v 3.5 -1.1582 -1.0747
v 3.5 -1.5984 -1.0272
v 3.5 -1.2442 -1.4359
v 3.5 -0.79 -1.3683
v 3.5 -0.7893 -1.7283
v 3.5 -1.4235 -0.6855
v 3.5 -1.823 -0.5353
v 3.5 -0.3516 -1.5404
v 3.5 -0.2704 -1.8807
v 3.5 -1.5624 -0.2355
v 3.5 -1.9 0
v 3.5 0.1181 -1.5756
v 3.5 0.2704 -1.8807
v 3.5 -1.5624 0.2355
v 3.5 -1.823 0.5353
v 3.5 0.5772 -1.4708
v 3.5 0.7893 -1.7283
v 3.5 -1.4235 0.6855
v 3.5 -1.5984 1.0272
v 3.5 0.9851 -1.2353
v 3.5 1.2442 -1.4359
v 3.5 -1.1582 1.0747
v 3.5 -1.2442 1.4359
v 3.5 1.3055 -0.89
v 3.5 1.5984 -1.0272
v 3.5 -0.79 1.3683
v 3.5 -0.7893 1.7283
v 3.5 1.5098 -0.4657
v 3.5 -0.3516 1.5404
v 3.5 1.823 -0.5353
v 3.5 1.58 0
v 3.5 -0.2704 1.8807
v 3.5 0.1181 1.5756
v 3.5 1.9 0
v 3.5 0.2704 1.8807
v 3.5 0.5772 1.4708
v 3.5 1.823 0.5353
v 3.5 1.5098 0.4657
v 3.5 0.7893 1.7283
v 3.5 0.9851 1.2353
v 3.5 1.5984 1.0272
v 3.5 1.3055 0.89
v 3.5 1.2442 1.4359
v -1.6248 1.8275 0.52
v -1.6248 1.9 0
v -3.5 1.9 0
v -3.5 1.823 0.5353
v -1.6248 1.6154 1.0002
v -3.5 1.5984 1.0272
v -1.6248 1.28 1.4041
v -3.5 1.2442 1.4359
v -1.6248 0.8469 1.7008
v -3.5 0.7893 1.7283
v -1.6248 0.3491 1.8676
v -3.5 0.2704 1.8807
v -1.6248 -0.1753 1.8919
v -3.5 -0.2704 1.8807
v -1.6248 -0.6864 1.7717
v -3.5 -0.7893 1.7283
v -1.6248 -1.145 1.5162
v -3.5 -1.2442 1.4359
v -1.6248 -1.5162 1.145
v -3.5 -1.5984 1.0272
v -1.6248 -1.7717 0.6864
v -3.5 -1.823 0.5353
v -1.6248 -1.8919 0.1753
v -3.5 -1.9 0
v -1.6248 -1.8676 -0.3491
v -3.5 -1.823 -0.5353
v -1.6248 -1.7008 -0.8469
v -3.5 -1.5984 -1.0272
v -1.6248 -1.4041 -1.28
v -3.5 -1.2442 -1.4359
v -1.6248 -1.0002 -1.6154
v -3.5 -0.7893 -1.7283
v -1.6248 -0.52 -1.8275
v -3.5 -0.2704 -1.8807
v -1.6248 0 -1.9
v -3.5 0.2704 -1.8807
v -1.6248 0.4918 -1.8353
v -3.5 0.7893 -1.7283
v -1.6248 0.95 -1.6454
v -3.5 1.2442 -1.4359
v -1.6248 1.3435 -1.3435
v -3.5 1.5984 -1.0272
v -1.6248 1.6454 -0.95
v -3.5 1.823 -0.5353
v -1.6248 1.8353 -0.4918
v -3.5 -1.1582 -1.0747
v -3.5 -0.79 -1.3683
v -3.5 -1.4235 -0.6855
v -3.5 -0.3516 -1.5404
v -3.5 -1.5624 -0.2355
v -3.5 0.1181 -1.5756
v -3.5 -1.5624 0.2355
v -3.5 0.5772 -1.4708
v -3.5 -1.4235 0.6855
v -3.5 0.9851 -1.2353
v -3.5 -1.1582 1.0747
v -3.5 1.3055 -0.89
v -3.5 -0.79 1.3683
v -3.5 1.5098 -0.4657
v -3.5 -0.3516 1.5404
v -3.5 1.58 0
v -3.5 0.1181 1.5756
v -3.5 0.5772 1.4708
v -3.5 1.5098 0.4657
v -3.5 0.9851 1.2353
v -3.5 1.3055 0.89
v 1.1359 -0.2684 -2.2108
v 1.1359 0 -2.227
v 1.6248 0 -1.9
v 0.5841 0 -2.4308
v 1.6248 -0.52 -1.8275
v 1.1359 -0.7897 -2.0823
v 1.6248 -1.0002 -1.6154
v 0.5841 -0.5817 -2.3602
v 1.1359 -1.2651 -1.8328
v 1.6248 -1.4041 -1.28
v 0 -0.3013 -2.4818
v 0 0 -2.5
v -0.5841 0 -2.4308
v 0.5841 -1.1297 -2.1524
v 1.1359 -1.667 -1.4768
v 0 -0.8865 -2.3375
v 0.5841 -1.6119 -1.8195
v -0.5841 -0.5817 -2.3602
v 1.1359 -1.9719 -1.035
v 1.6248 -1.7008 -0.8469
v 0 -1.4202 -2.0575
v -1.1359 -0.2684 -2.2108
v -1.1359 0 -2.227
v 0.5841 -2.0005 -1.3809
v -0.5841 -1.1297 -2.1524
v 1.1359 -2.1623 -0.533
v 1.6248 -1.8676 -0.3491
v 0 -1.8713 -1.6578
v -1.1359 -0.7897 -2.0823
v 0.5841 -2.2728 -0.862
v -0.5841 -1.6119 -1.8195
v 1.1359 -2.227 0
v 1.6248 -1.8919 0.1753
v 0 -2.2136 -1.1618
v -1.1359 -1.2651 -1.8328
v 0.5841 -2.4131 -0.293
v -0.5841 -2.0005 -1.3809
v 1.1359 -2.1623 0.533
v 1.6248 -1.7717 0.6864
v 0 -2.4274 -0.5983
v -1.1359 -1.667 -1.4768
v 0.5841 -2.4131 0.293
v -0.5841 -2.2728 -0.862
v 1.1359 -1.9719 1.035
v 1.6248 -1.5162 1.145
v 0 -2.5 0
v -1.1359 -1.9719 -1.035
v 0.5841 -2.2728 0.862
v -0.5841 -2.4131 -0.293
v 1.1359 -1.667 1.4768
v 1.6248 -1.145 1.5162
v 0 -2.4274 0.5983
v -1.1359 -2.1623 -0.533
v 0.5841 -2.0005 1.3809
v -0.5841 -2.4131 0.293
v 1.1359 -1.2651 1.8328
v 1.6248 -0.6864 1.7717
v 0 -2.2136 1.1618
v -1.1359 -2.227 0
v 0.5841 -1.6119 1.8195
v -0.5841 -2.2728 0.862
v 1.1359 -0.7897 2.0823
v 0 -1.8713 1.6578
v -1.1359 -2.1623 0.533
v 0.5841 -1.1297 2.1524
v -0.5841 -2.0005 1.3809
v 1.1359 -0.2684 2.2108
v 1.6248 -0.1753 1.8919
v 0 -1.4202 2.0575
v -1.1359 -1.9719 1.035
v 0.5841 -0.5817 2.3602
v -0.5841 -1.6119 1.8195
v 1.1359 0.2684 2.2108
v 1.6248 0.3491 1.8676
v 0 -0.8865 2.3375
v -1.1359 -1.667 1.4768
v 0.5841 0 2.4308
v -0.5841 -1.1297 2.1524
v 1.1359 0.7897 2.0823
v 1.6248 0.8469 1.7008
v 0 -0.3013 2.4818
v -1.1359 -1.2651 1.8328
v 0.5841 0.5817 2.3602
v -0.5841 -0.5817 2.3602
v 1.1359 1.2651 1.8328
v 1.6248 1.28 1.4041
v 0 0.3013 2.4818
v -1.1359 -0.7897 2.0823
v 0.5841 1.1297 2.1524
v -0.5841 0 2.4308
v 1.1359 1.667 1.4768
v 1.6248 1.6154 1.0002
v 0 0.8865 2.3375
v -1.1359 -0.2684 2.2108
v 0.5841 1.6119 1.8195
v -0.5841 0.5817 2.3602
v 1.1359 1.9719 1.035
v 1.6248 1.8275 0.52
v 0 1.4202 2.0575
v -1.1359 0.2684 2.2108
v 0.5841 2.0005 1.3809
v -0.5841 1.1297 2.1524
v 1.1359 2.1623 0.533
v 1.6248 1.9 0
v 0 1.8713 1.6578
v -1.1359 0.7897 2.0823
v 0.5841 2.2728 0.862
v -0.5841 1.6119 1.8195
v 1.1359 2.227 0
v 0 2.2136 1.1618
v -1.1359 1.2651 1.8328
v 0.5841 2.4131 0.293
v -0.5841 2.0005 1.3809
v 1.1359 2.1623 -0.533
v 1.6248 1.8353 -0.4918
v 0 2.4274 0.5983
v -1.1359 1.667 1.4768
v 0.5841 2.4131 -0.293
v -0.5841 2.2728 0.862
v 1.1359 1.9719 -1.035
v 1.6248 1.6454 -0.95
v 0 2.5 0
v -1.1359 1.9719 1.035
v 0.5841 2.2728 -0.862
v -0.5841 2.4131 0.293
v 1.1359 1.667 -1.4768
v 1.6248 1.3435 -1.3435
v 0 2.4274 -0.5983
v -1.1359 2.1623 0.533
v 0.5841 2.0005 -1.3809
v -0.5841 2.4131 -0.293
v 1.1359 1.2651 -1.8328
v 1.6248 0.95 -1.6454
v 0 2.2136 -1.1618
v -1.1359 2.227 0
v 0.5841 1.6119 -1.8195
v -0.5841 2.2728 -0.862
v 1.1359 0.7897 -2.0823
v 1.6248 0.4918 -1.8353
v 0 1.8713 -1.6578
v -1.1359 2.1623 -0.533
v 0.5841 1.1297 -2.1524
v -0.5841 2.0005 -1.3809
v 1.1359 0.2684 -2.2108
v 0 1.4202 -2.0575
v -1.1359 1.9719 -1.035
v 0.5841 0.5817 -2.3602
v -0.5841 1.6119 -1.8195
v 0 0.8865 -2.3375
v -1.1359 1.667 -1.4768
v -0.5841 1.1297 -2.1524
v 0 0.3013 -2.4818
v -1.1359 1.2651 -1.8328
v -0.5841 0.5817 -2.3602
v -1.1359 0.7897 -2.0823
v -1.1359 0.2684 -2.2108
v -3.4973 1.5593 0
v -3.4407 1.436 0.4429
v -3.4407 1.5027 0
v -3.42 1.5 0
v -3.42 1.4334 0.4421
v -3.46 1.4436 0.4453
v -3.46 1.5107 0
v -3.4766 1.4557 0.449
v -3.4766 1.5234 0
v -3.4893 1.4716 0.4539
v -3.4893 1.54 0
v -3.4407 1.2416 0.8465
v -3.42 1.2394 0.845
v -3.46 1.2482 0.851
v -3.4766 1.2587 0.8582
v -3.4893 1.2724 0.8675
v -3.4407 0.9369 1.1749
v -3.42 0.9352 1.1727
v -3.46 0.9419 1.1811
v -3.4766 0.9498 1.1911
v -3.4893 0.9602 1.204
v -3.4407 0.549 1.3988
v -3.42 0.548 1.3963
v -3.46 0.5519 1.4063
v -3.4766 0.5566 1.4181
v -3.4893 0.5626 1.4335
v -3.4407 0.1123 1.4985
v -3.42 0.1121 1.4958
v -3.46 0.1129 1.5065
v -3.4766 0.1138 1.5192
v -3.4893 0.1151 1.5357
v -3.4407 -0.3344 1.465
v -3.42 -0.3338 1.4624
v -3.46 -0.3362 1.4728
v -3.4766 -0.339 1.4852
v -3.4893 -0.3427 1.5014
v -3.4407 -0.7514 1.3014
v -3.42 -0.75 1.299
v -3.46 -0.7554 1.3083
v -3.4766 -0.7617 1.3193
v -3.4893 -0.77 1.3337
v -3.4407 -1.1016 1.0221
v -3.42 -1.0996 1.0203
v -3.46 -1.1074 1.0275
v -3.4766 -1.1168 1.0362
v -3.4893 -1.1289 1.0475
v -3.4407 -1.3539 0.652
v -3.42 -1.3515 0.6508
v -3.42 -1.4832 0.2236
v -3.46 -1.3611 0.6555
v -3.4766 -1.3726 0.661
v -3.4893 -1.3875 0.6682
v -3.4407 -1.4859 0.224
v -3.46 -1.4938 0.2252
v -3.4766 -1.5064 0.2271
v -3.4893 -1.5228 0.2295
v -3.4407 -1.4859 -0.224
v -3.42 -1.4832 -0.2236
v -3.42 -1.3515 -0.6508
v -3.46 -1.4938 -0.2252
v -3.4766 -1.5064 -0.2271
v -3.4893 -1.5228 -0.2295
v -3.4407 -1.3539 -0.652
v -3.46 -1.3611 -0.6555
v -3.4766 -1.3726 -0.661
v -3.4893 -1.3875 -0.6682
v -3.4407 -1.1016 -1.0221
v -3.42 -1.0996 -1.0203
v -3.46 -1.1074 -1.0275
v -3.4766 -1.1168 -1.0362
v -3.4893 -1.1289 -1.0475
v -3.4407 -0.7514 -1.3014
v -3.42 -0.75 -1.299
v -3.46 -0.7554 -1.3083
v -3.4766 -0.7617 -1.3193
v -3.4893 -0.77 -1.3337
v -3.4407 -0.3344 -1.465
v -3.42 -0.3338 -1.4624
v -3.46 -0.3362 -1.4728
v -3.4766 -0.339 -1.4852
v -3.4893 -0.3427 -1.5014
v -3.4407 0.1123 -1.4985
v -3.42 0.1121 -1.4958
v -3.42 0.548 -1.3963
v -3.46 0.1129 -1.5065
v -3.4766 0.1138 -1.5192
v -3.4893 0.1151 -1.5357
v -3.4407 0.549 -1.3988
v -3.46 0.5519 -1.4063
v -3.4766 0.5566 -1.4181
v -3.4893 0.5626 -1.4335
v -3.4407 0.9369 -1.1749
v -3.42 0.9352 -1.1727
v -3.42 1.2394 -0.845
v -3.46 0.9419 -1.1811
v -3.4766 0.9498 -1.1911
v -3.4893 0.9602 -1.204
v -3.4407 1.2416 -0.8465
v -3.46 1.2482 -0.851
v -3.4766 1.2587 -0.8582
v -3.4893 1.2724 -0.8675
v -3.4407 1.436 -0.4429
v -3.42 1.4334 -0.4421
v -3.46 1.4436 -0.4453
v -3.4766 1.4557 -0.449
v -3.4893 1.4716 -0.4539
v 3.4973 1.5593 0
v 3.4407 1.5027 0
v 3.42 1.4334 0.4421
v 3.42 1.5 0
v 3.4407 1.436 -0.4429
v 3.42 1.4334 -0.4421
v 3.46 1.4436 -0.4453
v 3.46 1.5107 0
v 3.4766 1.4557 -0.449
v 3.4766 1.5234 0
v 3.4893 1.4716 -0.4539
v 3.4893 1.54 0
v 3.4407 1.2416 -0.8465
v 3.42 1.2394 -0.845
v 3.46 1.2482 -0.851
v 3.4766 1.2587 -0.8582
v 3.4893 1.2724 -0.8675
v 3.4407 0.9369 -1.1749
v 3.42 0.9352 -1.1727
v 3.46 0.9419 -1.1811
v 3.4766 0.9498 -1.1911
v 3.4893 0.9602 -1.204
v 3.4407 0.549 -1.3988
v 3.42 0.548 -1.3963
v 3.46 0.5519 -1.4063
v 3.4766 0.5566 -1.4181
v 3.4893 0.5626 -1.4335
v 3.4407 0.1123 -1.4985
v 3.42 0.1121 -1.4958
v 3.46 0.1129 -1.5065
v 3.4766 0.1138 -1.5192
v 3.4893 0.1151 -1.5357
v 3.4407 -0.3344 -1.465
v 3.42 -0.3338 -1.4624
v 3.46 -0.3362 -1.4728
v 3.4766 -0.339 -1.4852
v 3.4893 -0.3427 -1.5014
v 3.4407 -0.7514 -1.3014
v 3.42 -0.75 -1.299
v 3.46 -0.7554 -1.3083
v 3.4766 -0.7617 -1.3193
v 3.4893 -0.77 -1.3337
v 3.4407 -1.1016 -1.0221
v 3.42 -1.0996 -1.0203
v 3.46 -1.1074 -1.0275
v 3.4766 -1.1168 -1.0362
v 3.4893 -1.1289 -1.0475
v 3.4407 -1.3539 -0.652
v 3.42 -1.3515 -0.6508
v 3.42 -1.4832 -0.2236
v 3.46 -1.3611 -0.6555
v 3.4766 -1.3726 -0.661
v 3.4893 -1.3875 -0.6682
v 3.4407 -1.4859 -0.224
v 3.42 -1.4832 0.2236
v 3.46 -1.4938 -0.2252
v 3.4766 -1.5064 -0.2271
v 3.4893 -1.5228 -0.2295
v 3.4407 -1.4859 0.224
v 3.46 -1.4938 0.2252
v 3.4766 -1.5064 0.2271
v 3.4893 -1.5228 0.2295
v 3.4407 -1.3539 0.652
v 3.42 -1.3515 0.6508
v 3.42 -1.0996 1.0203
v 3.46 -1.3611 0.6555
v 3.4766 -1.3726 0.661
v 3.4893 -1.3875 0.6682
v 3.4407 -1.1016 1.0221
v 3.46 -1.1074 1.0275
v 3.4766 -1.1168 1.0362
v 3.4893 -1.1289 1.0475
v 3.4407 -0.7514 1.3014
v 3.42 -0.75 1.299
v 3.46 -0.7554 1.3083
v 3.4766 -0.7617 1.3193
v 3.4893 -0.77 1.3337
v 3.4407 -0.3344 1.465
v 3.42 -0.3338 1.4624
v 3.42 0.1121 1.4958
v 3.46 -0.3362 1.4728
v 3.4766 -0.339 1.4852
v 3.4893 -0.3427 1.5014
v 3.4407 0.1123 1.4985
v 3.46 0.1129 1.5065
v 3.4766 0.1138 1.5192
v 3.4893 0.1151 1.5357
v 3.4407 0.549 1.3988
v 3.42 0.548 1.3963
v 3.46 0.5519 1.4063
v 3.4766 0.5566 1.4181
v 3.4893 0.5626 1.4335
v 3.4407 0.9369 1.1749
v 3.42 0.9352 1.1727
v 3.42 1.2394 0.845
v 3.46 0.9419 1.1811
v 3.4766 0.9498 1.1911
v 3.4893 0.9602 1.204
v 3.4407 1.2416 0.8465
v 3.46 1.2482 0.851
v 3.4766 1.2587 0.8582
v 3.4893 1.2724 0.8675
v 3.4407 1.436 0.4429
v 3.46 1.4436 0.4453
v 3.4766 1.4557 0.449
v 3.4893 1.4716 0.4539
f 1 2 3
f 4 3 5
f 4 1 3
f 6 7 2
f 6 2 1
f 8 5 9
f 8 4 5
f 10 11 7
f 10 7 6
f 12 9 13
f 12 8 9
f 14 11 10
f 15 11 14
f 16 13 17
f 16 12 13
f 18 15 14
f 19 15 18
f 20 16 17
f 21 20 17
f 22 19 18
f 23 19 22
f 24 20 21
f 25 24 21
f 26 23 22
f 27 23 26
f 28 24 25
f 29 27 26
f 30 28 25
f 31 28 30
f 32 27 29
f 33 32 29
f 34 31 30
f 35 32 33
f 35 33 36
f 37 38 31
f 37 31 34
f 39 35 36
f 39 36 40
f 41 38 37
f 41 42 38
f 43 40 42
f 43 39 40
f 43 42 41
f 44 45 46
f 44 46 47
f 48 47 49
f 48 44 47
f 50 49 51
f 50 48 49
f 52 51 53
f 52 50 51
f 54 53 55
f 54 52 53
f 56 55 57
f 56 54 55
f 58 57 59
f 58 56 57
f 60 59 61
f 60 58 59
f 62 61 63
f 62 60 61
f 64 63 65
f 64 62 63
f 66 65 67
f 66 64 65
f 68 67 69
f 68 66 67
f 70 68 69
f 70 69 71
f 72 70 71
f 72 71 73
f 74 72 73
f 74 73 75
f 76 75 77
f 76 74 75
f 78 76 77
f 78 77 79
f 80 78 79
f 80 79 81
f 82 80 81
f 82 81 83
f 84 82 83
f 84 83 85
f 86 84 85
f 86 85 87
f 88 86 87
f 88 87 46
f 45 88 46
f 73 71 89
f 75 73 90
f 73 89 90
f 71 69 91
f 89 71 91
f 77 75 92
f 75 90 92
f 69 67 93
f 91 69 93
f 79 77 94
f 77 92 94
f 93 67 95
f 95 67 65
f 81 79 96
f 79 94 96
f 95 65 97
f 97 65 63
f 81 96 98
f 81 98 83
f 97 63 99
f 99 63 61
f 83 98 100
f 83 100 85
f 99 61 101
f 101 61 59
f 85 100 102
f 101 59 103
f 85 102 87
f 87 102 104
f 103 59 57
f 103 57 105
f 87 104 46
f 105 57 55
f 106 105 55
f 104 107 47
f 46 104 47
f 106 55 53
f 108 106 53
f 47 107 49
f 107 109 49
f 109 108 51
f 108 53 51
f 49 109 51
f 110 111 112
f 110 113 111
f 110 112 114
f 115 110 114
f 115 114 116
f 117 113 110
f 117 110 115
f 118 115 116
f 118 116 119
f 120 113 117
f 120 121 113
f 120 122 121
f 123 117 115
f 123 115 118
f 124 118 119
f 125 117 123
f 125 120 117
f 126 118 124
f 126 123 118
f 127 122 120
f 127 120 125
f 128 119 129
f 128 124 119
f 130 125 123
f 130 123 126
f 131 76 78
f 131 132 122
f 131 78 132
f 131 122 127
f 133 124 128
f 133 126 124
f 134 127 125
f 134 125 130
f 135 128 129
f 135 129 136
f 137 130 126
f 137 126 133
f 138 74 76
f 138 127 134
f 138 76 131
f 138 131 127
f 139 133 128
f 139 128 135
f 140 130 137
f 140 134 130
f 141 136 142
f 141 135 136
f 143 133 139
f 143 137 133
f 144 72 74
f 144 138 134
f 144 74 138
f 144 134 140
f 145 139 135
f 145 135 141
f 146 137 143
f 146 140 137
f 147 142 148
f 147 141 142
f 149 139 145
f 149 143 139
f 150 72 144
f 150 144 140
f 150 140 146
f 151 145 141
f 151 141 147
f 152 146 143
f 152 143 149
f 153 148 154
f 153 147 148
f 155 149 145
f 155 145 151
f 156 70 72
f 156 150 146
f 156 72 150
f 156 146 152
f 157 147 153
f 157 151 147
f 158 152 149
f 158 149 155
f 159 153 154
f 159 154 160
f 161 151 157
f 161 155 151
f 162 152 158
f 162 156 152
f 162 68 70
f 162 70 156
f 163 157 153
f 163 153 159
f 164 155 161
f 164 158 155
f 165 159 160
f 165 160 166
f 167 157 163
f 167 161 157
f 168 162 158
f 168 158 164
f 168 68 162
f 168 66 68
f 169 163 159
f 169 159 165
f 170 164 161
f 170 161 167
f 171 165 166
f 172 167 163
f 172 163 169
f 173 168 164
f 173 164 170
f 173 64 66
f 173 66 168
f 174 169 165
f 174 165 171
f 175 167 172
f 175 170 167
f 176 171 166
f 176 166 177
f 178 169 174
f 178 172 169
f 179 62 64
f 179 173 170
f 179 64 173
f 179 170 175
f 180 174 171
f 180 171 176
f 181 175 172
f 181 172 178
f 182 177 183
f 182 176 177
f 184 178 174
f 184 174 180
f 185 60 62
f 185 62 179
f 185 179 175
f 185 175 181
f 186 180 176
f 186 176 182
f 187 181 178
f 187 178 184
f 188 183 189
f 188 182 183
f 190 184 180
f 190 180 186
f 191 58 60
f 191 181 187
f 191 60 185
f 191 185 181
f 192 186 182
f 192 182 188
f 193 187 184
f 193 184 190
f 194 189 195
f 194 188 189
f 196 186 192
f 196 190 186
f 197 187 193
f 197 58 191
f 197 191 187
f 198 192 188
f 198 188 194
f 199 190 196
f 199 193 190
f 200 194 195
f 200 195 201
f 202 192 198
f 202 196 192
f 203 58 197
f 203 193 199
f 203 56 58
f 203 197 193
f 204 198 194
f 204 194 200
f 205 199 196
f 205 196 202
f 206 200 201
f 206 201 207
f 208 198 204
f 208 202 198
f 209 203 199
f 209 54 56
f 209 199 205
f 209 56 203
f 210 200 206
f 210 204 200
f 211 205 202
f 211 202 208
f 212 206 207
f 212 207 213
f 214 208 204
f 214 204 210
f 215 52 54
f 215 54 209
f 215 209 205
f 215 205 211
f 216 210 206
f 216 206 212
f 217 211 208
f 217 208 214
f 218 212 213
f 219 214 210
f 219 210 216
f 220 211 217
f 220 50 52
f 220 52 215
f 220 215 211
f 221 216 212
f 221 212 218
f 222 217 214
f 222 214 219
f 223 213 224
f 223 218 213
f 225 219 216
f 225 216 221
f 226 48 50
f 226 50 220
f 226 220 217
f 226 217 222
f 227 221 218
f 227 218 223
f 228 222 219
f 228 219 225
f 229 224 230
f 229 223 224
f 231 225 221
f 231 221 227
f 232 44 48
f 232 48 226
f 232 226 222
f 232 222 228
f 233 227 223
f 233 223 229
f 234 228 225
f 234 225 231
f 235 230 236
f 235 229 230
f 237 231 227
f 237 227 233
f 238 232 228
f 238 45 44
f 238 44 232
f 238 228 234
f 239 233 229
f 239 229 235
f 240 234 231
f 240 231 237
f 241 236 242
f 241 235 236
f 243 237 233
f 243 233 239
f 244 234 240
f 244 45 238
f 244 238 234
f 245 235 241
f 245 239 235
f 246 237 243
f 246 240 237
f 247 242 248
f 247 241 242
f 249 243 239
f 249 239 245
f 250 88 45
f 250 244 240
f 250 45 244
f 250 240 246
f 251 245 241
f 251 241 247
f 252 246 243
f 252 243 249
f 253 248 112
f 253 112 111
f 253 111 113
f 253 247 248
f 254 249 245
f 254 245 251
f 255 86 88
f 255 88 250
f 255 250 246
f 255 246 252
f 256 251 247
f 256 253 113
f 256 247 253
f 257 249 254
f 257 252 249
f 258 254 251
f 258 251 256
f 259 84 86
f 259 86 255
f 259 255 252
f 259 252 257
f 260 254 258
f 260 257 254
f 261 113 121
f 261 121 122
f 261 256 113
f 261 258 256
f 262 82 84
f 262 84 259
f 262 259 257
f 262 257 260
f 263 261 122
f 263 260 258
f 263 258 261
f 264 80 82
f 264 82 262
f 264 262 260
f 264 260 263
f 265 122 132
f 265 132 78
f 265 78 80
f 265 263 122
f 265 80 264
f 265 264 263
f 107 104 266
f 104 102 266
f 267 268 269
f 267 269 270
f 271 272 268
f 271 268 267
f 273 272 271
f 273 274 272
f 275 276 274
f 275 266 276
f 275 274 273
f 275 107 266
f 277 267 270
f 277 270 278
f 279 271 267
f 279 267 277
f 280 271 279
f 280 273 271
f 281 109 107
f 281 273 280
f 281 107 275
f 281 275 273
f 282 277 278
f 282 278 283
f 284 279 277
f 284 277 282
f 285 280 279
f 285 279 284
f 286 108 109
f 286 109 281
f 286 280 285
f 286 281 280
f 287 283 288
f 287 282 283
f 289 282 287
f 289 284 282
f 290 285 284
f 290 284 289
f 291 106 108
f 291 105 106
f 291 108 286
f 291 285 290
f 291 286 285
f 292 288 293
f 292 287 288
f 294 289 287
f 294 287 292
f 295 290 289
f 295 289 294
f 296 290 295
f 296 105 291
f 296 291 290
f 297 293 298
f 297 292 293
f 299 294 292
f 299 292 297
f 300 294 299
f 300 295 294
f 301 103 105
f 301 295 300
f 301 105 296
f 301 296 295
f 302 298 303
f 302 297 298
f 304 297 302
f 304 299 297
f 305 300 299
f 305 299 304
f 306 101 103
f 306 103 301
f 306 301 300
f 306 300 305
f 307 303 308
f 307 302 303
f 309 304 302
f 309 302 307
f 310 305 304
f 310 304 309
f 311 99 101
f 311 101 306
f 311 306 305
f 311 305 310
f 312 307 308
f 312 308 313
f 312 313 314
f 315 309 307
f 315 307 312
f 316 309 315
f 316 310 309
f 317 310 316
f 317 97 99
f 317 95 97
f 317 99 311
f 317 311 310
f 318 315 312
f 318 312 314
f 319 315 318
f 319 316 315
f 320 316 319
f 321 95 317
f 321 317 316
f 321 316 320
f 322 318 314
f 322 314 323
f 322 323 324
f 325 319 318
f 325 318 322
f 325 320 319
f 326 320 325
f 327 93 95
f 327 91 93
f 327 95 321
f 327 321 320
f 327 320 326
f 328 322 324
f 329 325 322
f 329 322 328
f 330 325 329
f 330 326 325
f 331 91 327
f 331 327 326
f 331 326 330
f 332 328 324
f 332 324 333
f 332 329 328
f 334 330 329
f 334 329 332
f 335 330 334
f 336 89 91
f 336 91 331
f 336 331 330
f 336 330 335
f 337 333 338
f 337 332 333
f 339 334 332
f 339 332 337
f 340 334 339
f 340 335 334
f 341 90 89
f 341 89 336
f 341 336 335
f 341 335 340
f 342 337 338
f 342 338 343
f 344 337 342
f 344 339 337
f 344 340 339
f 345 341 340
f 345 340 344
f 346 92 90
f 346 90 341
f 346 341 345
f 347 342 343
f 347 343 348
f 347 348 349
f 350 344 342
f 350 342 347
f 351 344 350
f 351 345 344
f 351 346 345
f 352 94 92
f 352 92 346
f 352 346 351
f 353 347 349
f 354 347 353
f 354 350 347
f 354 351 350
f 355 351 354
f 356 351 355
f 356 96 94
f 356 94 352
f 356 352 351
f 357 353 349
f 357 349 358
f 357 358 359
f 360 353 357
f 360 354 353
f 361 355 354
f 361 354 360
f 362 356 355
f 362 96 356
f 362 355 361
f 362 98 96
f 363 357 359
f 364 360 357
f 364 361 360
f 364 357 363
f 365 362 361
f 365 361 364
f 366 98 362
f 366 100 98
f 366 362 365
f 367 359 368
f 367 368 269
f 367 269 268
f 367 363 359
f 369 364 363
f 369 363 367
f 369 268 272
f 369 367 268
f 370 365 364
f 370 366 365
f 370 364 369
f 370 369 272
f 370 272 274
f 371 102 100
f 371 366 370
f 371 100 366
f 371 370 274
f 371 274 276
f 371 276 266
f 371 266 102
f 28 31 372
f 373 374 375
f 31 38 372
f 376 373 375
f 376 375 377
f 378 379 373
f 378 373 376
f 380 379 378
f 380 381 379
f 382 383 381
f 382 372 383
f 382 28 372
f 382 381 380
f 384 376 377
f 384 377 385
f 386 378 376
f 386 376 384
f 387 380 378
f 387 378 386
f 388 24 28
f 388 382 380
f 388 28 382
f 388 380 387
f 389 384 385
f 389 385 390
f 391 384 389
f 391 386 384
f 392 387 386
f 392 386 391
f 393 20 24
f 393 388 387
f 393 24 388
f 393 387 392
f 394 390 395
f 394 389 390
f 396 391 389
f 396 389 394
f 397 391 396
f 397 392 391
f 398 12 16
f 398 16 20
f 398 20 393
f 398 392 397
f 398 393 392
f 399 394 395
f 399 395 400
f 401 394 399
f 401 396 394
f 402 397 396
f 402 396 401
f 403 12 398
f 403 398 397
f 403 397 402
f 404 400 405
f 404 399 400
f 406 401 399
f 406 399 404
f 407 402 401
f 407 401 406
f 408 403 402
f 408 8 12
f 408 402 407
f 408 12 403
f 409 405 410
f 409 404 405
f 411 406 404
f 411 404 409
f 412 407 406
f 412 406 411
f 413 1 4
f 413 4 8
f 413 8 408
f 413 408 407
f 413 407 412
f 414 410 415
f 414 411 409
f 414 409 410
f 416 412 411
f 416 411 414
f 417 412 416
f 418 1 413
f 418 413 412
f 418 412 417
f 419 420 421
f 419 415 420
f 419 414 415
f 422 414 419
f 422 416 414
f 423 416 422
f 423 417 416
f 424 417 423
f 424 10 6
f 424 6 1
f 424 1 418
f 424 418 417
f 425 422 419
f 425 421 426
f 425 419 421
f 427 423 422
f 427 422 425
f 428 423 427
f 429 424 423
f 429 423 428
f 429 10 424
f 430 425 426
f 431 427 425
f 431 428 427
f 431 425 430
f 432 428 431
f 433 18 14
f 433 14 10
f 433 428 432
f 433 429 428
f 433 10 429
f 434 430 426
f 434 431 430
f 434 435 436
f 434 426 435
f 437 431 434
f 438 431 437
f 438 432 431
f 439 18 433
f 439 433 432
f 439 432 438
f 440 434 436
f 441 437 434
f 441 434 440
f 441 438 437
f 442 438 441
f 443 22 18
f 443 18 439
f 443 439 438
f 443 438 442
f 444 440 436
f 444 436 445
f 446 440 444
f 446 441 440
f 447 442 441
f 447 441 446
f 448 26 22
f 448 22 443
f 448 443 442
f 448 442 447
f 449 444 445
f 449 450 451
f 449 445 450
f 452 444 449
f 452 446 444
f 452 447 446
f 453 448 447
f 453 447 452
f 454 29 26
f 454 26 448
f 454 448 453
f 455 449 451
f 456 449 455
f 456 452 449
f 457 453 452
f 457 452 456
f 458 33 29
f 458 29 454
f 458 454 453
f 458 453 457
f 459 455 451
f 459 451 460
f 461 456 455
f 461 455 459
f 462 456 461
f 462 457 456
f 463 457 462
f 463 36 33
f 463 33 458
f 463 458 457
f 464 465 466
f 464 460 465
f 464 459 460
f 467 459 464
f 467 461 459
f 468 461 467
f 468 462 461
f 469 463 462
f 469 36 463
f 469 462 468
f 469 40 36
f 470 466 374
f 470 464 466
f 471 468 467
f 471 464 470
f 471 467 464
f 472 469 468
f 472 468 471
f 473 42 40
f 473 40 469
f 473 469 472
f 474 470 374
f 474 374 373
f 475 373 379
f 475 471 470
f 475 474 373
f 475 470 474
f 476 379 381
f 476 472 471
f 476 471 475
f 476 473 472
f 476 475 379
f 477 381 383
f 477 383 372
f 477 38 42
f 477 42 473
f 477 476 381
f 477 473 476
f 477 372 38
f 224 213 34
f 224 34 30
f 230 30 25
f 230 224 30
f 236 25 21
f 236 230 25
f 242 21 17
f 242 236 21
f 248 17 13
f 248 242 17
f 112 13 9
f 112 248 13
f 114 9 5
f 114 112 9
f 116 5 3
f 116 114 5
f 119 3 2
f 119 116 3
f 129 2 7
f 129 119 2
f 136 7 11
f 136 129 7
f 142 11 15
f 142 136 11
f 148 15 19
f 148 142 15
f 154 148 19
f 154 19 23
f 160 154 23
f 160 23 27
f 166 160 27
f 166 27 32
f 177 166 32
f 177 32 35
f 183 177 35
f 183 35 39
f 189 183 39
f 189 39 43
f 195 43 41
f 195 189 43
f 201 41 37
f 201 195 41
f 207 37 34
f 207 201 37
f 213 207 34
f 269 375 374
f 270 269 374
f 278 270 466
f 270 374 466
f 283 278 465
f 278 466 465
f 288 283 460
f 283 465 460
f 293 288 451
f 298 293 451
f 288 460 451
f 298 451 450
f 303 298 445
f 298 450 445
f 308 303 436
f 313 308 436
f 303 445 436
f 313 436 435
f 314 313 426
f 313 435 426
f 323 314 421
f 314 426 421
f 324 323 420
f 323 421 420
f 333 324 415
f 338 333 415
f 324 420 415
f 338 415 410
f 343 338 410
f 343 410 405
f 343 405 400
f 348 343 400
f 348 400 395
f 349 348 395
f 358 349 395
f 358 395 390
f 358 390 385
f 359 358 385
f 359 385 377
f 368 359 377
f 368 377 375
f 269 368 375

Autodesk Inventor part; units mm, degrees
ref_plane "XZ Plane" through (0, 0, 0) normal (0, 1, 0) x (-1, 0, 0)
ref_plane "XY Plane" through (0, 0, 0) normal (0, 0, 1) x (1, 0, 0)
sketch "Boceto1" plane through (0, 0, 0) normal (0, 1, 0) x (-1, 0, 0)
  arc A0 (-2.5, 0) -> (2.5, 0) centre (0, 0) ccw
  line L0 (-2.5, 0) -> (2.5, 0)
  dimension "d0" = 5
revolve "Revolución1" add sketch "Boceto1" angle 360 about axis through (2.5, 0, 0) along (-1, 0, 0)
ref_plane "Plano de trabajo1" through (2.5, 0, 0) normal (1, 0, 0) x (0, 1, 0)
sketch "Boceto2" plane through (2.5, 0, 0) normal (1, 0, 0) x (0, 1, 0)
  circle A0 centre (0, 0) radius 1.5
  circle A1 centre (0, 0) radius 1.9
  dimension "d3" = 3
  dimension "d4" = 3.8
extrude "Extrusión1" add sketch "Boceto2" along normal blind 1 and the other way blind 6
sketch "Boceto3" plane through (2.5, 0, 0) normal (1, 0, 0) x (0, 1, 0)
  circle A0 centre (0, 0) radius 1.5
extrude "Extrusión2" cut sketch "Boceto3" against normal blind 10000
fillet "Empalme1" radius 0.08 2 edges at (-3.5, -1.5, 0) (3.5, -1.5, 0)
properties part number "Bola_libertad_grande"
